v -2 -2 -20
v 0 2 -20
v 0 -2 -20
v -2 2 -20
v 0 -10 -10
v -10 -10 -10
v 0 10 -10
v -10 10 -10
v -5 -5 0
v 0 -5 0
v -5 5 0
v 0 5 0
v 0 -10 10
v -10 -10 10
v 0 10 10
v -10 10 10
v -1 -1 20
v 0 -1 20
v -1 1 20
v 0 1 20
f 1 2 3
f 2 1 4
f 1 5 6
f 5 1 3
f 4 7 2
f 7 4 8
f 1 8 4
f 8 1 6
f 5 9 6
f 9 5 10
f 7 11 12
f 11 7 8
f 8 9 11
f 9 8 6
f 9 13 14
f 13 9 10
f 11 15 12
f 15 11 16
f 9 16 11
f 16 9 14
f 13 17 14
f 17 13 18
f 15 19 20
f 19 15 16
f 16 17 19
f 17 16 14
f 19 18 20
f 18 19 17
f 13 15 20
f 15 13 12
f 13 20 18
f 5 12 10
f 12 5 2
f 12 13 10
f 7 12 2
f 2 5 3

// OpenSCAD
//sweep example
flaechen =
[
  [
    [-2,-2,-20],
    [2,-2,-20],
    [2,2,-20],
    [-2,2,-20],
  ],
  [
    [-10,-10,-10],
    [10,-10,-10],
    [10,10,-10],
    [-10,10,-10],
  ],
  [
    [-5,-5,0],
    [5,-5,0],
    [5,5,0],
    [-5,5,0],
  ],
  [
    [-10,-10,10],
    [10,-10,10],
    [10,10,10],
    [-10,10,10],
  ],
  [
    [-1,-1,20],
    [1,-1,20],
    [1,1,20],
    [-1,1,20],
  ],
  ];
//echo(to2D(flaechen[1]));
//echo("flatten ",flatten(flaechen));
//echo("len",len(flaechen));
///echo("flaechen",flaechen(flaechen));
//color("green") translate([0,0,-10])polygon(to2D(flaechen[0]));
//color("green") translate([0,0,10])polygon(to2D(flaechen[1]));
//polyhedron(flatten(flaechen),flaechen(flaechen));

difference()
{
  sweep(flaechen,true);
  translate([25,0,0]) rotate([45,0,0]) cube([50,50,50], center = true);
}


//start of lib
//determine max values in array
function max3D(arr, pos=0, res)= 
  let( 
      res=is_undef(res)? [0,0,0]:res
     ) 
  pos == len(arr)-1? res: 
  pos ==0? max3D(arr=arr,pos=pos+1,res): 
let(
    x=res[0]>arr[pos][0]?res[0]:arr[pos][0],
    y=res[1]>arr[pos][1]?res[1]:arr[pos][1],
    z=res[2]>arr[pos][2]?res[2]:arr[pos][2]
   )
  max3D(arr=arr,pos=pos+1,[x,y,z]);
//determine min values in array
function min3D(arr, pos=0, res)= 
  let( 
      res=is_undef(res)? [100000,100000,100000]:res
     ) 
  pos == len(arr)-1? res: 
  pos ==0? min3D(arr=arr,pos=pos+1,res): 
let(
    x=res[0]<arr[pos][0]?res[0]:arr[pos][0],
    y=res[1]<arr[pos][1]?res[1]:arr[pos][1],
    z=res[2]<arr[pos][2]?res[2]:arr[pos][2]
   )
  min3D(arr=arr,pos=pos+1,[x,y,z]);
//remove the z component
function to2D(vector) = [for(line = vector) [line[0],line[1]]];
//up all elements one step
function flatten(vector) = [for(line = vector) each(line)];
function flaechen(vector, closed = true) = 
let(breite = len(vector[0]), laenge = len(vector)-1) 
  [
if(closed)[ for( l = [0: breite-1]) l, ],
  for(i = [0: len(vector)-2]) 
for(n = [0: breite-1]) 
  [
    i*breite+n,
    i*breite+n+breite,
    (n+1 < breite)? i*breite+n+breite+1:i*breite+1+n, 
    (n+1 < breite)? i*breite+n+1:i*breite+1+n-breite
    //i*breite+n,
    //(i+1)*breite+n,
    //(n+1 < breite)? (i+1)*breite+1+n:i*breite+1+n, 
    //(n+1 < breite)?(i*breite)+1+n:(i*breite)+1+n-breite
    ],
    if(closed)[ for( l = [laenge*breite+breite-1: -1:laenge*breite]) l, ],
    ];
//circle function
function f(w,r) =  [r*sin(w), r*cos(w)];
function circleFunc(w,r) =  [r*cos(w), r*sin(w)];
//absoulte difference
function absdiff(p1,p2) =  p1>p2? abs(p1 - p2): abs(p2 - p1);
function applyFunc( rad=5, prec=.01, sw=0, ew=90,step = 3, prec=.01, list ) =
let( list = is_undef(list) ? [f(sw,r=rad)] : list,
    fi=f(sw,rad),
    pointdiff = absdiff(fi[1],list[len(list)-1][1])
   )
  //echo("sw = ",sw ,ew," diff:",pointdiff,prec,fi)
  (sw >= ew )? let(fi=f(ew,rad))[for(i=[0:len(list)-2]) if(absdiff(fi[1],list[i][1])> prec)list[i], fi] : 

  pointdiff >prec?
  applyFunc( rad=rad, prec=prec, sw=sw+step,ew=ew,step=step, list=[ each list, fi ] ):
  applyFunc( rad=rad, prec=prec, sw=sw+step,ew=ew,step=step, list=list );

function xaufrunden(toround, r, fn, sw, ew, prec=.1)= 
  let(
      fi=f(w=sw, r=r),
      zoff=fi[1] == 0? f(w=ew, r=r)[1]:fi[1],
      //xoff=toround[0]-(fi[0] == 0? f(w=ew, r=r)[0]:fi[0]),
      xoff=f(w=ew, r=r)[0] != 0?f(w=ew, r=r)[0]: f(w=sw, r=r)[0] ,
      //zoff = (len(toround) == 3)? (toround[2]<0)? vzoff: vzoff :-vzoff, 
      step = (ew-sw)/fn,
      pos= applyFunc( rad=r, sw=sw, ew=ew,step = step, prec=prec)
  )
  //echo("to round: ",toround, len(toround), " zoff:",zoff, " x",xoff)
  [for(apos = pos) len(toround) == 1?[toround[0]-apos[0]]:
  len(toround) == 2?[toround[0]-apos[0],apos[1]+toround[1]-zoff]:
  [apos[0]+toround[0]-xoff ,toround[1],toround[2]+apos[1]-zoff]
  ] ;
function invertDirection(vector)=[for (n=[len(vector)-1:-1:0])vector[n]];

module sweep(slices, closed = false)
{
  polyhedron(flatten(slices),flaechen(slices, closed));
}
